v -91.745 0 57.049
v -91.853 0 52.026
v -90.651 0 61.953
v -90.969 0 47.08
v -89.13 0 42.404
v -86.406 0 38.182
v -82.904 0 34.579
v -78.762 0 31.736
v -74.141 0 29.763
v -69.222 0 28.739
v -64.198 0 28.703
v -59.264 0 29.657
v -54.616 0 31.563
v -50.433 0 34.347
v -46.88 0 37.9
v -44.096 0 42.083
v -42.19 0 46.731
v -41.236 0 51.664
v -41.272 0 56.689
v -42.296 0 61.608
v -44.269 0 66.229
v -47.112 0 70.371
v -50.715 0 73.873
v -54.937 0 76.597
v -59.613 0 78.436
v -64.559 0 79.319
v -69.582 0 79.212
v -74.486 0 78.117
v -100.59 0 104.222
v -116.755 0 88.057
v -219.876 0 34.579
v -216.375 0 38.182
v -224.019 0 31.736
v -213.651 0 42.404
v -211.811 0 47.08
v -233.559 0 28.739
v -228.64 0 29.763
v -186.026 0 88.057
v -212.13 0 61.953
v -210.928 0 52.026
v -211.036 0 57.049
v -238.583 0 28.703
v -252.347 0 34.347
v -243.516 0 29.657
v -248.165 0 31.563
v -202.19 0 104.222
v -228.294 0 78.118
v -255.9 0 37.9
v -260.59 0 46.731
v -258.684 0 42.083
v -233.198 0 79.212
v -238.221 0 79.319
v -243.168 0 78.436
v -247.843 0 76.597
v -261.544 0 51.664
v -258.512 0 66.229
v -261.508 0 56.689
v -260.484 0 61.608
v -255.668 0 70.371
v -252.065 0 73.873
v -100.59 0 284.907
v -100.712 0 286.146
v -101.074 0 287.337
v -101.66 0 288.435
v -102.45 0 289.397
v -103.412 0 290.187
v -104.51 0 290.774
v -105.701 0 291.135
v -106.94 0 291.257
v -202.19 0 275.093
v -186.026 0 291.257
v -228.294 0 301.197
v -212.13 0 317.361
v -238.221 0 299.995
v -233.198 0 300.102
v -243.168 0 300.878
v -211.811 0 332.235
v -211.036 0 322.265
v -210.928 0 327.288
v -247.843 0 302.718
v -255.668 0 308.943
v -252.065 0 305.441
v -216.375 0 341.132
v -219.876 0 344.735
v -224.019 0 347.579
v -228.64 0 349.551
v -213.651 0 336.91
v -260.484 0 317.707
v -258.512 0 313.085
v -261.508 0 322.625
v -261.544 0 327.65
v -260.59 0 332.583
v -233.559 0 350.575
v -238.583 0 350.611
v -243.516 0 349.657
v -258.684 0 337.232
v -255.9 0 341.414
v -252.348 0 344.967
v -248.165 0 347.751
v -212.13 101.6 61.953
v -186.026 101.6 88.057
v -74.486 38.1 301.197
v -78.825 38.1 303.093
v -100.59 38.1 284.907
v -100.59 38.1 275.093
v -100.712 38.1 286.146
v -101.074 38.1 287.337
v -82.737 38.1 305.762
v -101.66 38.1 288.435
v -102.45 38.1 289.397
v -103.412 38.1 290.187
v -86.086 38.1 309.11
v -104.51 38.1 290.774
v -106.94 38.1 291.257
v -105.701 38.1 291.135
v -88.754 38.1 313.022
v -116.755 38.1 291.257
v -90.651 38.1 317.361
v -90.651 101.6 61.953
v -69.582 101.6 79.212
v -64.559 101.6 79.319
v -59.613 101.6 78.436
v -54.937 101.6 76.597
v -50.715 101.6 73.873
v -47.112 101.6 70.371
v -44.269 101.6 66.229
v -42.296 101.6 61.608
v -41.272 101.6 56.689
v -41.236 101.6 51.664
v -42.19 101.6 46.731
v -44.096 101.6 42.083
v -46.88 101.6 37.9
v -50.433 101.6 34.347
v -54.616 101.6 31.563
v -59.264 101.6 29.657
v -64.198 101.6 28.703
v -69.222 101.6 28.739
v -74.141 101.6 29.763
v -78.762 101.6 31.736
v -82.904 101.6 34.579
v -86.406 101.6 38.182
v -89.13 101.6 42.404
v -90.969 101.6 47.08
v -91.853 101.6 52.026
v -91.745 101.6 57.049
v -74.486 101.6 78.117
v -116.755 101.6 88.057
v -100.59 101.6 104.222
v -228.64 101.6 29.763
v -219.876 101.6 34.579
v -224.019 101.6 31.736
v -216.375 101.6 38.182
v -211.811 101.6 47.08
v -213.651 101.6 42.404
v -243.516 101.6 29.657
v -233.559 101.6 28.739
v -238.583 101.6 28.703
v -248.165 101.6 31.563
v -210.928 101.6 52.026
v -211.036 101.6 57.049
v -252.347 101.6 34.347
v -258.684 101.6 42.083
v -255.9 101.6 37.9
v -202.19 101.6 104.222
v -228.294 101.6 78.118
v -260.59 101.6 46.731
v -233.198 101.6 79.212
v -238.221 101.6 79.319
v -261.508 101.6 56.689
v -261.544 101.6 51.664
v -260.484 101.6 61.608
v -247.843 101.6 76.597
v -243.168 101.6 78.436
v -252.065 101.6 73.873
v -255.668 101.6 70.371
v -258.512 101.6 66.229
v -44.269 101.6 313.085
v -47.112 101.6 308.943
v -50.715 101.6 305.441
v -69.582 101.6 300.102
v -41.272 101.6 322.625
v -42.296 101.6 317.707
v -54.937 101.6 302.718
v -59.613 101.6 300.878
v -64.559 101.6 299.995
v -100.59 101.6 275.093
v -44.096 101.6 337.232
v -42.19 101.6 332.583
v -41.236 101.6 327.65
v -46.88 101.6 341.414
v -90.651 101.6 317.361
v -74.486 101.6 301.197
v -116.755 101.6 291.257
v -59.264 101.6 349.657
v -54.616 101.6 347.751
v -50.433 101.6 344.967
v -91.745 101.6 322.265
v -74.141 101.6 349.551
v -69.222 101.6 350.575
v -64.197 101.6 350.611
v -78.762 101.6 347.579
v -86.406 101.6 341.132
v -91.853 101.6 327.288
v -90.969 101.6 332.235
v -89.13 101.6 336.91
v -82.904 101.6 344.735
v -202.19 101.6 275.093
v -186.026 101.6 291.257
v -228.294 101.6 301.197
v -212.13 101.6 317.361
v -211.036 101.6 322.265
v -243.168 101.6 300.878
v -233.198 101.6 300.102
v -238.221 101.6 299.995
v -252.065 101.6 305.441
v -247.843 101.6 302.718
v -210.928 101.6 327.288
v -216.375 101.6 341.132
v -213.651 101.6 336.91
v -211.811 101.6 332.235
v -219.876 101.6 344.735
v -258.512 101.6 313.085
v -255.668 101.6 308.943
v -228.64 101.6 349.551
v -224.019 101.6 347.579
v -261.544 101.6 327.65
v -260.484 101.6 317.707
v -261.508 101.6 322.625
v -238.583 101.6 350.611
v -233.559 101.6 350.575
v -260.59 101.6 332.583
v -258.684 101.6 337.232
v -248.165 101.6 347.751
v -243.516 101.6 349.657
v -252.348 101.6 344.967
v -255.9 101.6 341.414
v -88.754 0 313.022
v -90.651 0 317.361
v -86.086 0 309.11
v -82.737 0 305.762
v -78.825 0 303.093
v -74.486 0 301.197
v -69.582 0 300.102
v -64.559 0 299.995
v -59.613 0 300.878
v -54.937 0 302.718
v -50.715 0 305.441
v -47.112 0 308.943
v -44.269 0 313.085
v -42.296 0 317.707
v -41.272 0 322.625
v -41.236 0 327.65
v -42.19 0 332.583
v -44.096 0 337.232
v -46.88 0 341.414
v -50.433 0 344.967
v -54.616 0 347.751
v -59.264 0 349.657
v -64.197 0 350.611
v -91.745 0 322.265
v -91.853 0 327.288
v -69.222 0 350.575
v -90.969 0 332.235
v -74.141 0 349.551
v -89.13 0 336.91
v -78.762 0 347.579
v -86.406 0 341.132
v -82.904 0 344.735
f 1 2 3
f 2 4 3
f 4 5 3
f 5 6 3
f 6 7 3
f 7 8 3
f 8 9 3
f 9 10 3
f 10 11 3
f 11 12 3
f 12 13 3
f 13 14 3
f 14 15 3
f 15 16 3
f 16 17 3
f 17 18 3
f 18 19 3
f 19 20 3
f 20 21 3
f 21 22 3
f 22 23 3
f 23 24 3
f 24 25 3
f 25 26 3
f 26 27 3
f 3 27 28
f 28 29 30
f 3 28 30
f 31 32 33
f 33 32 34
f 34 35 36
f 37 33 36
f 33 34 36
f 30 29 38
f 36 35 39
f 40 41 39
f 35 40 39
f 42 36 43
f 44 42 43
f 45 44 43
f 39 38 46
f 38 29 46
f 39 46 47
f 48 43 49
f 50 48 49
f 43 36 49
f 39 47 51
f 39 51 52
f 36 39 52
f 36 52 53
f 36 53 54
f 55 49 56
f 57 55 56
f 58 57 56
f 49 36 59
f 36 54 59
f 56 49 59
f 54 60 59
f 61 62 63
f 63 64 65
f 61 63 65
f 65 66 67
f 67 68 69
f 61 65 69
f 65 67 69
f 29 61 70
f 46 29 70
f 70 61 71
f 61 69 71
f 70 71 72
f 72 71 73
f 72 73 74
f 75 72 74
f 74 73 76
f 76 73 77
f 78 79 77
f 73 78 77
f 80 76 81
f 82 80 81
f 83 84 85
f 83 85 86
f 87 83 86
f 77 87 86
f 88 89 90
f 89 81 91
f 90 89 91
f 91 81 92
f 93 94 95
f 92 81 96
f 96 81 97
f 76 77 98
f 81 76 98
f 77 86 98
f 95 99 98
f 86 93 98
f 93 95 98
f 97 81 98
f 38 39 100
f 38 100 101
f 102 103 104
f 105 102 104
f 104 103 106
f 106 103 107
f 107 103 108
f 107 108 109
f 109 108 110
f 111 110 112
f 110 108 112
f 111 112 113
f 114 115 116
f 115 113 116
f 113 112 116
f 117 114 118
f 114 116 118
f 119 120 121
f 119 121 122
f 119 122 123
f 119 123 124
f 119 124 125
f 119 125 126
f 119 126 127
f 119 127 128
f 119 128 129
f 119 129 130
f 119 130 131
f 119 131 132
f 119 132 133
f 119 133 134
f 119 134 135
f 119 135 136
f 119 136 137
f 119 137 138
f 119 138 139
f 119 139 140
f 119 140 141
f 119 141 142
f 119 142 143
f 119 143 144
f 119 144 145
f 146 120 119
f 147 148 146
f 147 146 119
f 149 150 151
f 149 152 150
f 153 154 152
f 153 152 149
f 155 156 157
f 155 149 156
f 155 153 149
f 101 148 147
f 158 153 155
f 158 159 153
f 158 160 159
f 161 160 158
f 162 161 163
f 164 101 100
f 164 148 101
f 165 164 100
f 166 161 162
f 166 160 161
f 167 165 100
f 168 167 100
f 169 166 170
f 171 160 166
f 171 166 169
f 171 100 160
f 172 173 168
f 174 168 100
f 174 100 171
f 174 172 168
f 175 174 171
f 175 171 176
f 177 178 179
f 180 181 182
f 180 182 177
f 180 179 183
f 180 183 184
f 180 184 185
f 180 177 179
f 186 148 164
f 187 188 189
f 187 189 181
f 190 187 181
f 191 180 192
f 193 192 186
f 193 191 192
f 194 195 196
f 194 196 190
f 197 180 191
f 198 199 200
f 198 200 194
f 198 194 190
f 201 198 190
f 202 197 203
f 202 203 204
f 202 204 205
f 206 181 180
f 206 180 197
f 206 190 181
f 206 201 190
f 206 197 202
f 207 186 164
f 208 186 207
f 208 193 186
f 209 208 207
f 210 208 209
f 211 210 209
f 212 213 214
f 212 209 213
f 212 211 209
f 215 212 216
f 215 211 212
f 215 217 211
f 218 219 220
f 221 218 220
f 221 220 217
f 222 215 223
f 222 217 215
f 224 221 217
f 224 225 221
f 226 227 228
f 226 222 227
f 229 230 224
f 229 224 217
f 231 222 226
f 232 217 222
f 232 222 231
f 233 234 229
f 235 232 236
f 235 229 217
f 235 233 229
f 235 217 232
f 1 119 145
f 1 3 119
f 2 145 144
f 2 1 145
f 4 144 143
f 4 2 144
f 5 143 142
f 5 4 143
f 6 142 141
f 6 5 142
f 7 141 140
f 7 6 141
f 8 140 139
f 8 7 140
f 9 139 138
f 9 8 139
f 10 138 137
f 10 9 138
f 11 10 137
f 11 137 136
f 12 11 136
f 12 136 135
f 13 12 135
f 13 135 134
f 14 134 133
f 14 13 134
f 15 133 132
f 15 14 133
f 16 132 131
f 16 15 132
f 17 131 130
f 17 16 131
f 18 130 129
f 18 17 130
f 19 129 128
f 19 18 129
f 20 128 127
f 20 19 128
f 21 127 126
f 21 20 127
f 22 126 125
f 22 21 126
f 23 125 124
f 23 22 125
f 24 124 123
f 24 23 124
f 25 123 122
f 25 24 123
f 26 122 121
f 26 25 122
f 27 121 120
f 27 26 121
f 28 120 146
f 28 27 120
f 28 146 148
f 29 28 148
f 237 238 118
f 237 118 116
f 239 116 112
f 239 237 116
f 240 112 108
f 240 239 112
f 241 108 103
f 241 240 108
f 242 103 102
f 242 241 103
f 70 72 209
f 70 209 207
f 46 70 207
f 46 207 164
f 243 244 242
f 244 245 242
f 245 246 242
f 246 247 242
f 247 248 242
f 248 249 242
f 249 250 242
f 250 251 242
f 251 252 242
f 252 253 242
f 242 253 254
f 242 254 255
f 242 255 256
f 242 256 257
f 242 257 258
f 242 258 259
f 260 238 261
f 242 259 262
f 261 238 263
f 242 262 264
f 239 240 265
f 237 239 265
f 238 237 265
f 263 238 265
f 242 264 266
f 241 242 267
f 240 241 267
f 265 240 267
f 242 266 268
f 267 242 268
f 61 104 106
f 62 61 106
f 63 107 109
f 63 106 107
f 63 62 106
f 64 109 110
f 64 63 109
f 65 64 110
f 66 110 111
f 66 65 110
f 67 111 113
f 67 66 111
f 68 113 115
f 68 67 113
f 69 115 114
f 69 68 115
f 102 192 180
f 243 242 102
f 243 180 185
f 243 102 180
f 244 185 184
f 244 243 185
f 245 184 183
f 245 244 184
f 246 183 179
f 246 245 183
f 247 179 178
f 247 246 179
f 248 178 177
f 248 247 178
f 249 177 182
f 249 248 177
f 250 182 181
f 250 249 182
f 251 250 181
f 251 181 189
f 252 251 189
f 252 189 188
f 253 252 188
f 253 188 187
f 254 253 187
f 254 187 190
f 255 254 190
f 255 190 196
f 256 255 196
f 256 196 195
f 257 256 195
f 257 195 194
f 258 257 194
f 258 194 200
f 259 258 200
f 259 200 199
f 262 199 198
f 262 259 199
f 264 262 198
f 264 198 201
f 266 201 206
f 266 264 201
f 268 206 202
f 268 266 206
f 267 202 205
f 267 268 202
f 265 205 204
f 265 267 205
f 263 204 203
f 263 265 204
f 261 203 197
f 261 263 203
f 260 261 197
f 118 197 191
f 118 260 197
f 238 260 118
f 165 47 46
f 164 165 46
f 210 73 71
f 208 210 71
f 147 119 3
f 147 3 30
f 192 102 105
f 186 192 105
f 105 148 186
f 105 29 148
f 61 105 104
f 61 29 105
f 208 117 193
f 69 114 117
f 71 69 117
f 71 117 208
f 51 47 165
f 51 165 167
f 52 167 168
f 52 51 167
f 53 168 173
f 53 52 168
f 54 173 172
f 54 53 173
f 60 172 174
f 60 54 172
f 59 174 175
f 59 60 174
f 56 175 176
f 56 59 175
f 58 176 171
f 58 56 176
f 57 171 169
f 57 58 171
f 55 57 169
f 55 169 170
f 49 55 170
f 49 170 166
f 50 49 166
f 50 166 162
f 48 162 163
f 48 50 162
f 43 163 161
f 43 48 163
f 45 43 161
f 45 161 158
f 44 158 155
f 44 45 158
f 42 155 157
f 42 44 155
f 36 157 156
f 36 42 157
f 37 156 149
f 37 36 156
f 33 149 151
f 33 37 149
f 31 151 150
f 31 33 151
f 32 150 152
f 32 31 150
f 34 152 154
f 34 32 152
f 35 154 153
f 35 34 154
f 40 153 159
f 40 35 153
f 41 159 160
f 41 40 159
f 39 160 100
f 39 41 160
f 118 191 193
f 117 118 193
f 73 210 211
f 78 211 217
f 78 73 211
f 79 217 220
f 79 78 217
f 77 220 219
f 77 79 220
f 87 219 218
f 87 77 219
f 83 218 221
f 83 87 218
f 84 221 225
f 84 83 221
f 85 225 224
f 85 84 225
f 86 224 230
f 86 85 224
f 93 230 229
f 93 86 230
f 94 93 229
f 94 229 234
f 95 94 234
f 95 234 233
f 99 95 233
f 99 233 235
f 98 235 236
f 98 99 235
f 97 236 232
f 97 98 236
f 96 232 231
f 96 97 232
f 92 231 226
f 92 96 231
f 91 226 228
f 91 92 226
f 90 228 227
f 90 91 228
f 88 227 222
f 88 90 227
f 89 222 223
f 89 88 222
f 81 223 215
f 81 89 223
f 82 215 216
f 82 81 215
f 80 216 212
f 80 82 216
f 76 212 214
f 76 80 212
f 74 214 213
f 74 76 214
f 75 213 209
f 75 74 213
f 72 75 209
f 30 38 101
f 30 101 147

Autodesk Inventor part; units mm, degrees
ref_plane "YZ Plane" through (0, 0, 0) normal (1, 0, 0) x (0, 1, 0)
ref_plane "XZ Plane" through (0, 0, 0) normal (0, 1, 0) x (-1, 0, 0)
ref_plane "XY Plane" through (0, 0, 0) normal (0, 0, 1) x (1, 0, 0)
sketch "Sketch1" plane through (0, 0, 0) normal (0, 1, 0) x (-1, 0, 0)
  line L0 (106.9403, 291.2572) -> (195.8403, 291.2572)
  line L1 (202.1903, 284.9072) -> (202.1903, 94.4072)
  line L2 (195.8403, 88.0572) -> (106.9403, 88.0572)
  line L3 (100.5903, 94.4072) -> (100.5903, 284.9072)
  arc A0 (202.1903, 284.9072) -> (195.8403, 291.2572) centre (195.8403, 284.9072) ccw
  arc A1 (195.8403, 88.0572) -> (202.1903, 94.4072) centre (195.8403, 94.4072) ccw
  arc A2 (106.9403, 291.2572) -> (100.5903, 284.9072) centre (106.9403, 284.9072) ccw
  arc A3 (100.5903, 94.4072) -> (106.9403, 88.0572) centre (106.9403, 94.4072) ccw
  line L4 (200.3304, 289.3973) -> (236.2514, 325.3183)
  line L5 (200.3304, 289.3973) -> (251.1304, 289.3973) construction
  line L6 (200.3304, 89.917) -> (236.2514, 53.996)
  line L7 (200.3304, 89.917) -> (251.1304, 89.917) construction
  line L8 (102.4502, 289.3973) -> (66.5291, 325.3183) construction
  line L9 (102.4502, 89.917) -> (66.5291, 53.996)
  line L10 (102.4502, 89.917) -> (153.2502, 89.917) construction
  arc A4 (228.2944, 301.1968) -> (212.13, 317.3613) centre (236.2514, 325.3183) ccw
  circle A5 centre (236.2514, 53.996) radius 25.4
  arc A6 (90.6506, 317.3613) -> (74.4862, 301.1968) centre (66.5291, 325.3183) ccw
  circle A7 centre (66.5291, 53.996) radius 25.4
  line L11 (66.5291, 325.3183) -> (58.4469, 317.2361)
  line L12 (58.4469, 317.2361) -> (100.5903, 275.0927)
  line L13 (66.5291, 325.3183) -> (74.6114, 333.4006)
  line L14 (74.6114, 333.4006) -> (116.7547, 291.2572)
  line L15 (236.2514, 325.3183) -> (228.1692, 333.4006)
  line L16 (228.1692, 333.4006) -> (236.2514, 325.3183)
  line L17 (236.2514, 325.3183) -> (244.3337, 317.2361)
  line L18 (228.1692, 333.4006) -> (186.0258, 291.2572)
  line L19 (244.3337, 317.2361) -> (202.1903, 275.0927)
  line L20 (293.8482, 183.4348) -> (-26.9886, 183.4348) construction
  line L21 (236.2514, 53.996) -> (228.1692, 45.9138)
  line L22 (236.2514, 53.996) -> (247.6814, 53.996) construction
  line L23 (236.2514, 53.996) -> (244.3337, 62.0783)
  line L24 (228.1692, 45.9138) -> (186.0258, 88.0572)
  line L25 (244.3337, 62.0783) -> (202.1903, 104.2216)
  line L26 (66.5291, 53.996) -> (74.6114, 45.9138)
  line L27 (66.5291, 53.996) -> (58.4469, 62.0783)
  line L28 (58.4469, 62.0783) -> (100.5903, 104.2216)
  line L29 (74.6114, 45.9138) -> (116.7547, 88.0572)
  circle A8 centre (66.5291, 325.3183) radius 25.4
  circle A9 centre (236.2514, 325.3183) radius 25.4
  line L30 (66.5291, 325.3183) -> (102.4502, 289.3973)
  point P0 (0, 0)
  point P1 (202.1903, 88.0572)
  point P2 (202.1903, 291.2572)
  point P3 (100.5903, 88.0572)
  point P4 (228.2944, 78.1175)
  point P5 (212.13, 61.953)
  point P6 (74.4862, 78.1175)
  point P7 (90.6506, 61.953)
  point P8 (74.4862, 301.1968)
  dimension "d0" = 101.6
  dimension "d1" = 203.2
  dimension "d2" = 6.35
  dimension "d3" = 50.8
  dimension "d4" = 45
  dimension "d5" = 50.8
  dimension "d6" = 45
  dimension "d7" = 50.8
  dimension "d8" = 50.8
  dimension "d9" = 135
  dimension "d10" = 50.8
  dimension "d11" = 50.8
  dimension "d12" = 50.8
  dimension "d13" = 50.8
  dimension "d14" = 11.43
  dimension "d15" = 11.43
  dimension "d16" = 11.43
  dimension "d17" = 135
  dimension "d18" = 11.43
  dimension "d19" = 11.43
  dimension "d20" = 11.43
extrude "Extrusion1" add sketch "Sketch1" along normal blind 101.6 contours L0 A0 L1 A1 L2 A3 L3 A2
extrude "Extrusion2" add sketch "Sketch1" along normal blind 101.6 contours A2 L30 A8 L14 L0 | A2 L3 L12 A8 L30 | L18 A9 L4 A0 L0 | L14 L13 L11 L12 A6 | A8 L30 L13 L14 | A8 L12 L11 L30 | A4 L19 L17 L15 L18 | L18 L15 L4 A9 | L4 A9 L19 L1 A0 | L4 L17 L19 A9 | L3 A3 L9 A7 L28 | L28 L27 L26 L29 A7 | A7 L9 L27 L28 | A3 L2 L29 A7 L9 | A7 L29 L26 L9 | L25 A5 L6 A1 L1 | L25 L23 L6 A5 | A5 L24 L21 L23 L25 | L6 A5 L24 L2 A1 | L6 L21 L24 A5
extrude "Extrusion3" cut sketch "Sketch1" along normal blind 38.1 contours A2 L30 A8 L14 L0 | A2 L3 L12 A8 L30
sketch "Sketch2" plane through (0, 101.6, 0) normal (0, 1, 0) x (1, 0, 0)
  line L0 (106.9403, 291.2572) -> (195.8403, 291.2572)
  line L1 (202.1903, 284.9072) -> (202.1903, 94.4072)
  line L2 (195.8403, 88.0572) -> (106.9403, 88.0572)
  line L3 (100.5903, 94.4072) -> (100.5903, 284.9072)
  arc A0 (202.1903, 284.9072) -> (195.8403, 291.2572) centre (195.8403, 284.9072) ccw
  arc A1 (195.8403, 88.0572) -> (202.1903, 94.4072) centre (195.8403, 94.4072) ccw
  arc A2 (106.9403, 291.2572) -> (100.5903, 284.9072) centre (106.9403, 284.9072) ccw
  arc A3 (100.5903, 94.4072) -> (106.9403, 88.0572) centre (106.9403, 94.4072) ccw
  line L4 (200.3304, 289.3973) -> (236.2514, 325.3183)
  line L5 (200.3304, 289.3973) -> (251.1304, 289.3973) construction
  line L6 (200.3304, 89.917) -> (236.2514, 53.996)
  line L7 (200.3304, 89.917) -> (251.1304, 89.917) construction
  line L8 (102.4502, 289.3973) -> (66.5291, 325.3183) construction
  line L9 (102.4502, 89.917) -> (66.5291, 53.996)
  line L10 (102.4502, 89.917) -> (153.2502, 89.917) construction
  arc A4 (228.2944, 301.1968) -> (212.13, 317.3613) centre (236.2514, 325.3183) ccw
  circle A5 centre (236.2514, 53.996) radius 25.4
  arc A6 (90.6506, 317.3613) -> (74.4862, 301.1968) centre (66.5291, 325.3183) ccw
  circle A7 centre (66.5291, 53.996) radius 25.4
  line L11 (66.5291, 325.3183) -> (58.4469, 317.2361)
  line L12 (58.4469, 317.2361) -> (100.5903, 275.0927)
  line L13 (66.5291, 325.3183) -> (74.6114, 333.4006)
  line L14 (74.6114, 333.4006) -> (116.7547, 291.2572)
  line L15 (236.2514, 325.3183) -> (228.1692, 333.4006)
  line L16 (228.1692, 333.4006) -> (236.2514, 325.3183)
  line L17 (236.2514, 325.3183) -> (244.3337, 317.2361)
  line L18 (228.1692, 333.4006) -> (186.0258, 291.2572)
  line L19 (244.3337, 317.2361) -> (202.1903, 275.0927)
  line L20 (293.8482, 183.4348) -> (-26.9886, 183.4348) construction
  line L21 (236.2514, 53.996) -> (228.1692, 45.9138)
  line L22 (236.2514, 53.996) -> (247.6814, 53.996) construction
  line L23 (236.2514, 53.996) -> (244.3337, 62.0783)
  line L24 (228.1692, 45.9138) -> (186.0258, 88.0572)
  line L25 (244.3337, 62.0783) -> (202.1903, 104.2216)
  line L26 (66.5291, 53.996) -> (74.6114, 45.9138)
  line L27 (66.5291, 53.996) -> (58.4469, 62.0783)
  line L28 (58.4469, 62.0783) -> (100.5903, 104.2216)
  line L29 (74.6114, 45.9138) -> (116.7547, 88.0572)
  circle A8 centre (66.5291, 325.3183) radius 25.4
  circle A9 centre (236.2514, 325.3183) radius 25.4
  line L30 (66.5291, 325.3183) -> (102.4502, 289.3973)
  line L31 (200.3304, 289.3973) -> (102.4502, 89.917)
  line L32 (200.3304, 89.917) -> (102.4502, 289.3973)
  point P0 (0, 0)
  point P1 (202.1903, 88.0572)
  point P2 (202.1903, 291.2572)
  point P3 (100.5903, 88.0572)
  point P4 (228.2944, 78.1175)
  point P5 (212.13, 61.953)
  point P6 (74.4862, 78.1175)
  point P7 (90.6506, 61.953)
  point P8 (74.4862, 301.1968)
  dimension "d27" = 101.6
  dimension "d28" = 203.2
  dimension "d29" = 6.35
  dimension "d30" = 50.8
  dimension "d31" = 45
  dimension "d32" = 50.8
  dimension "d33" = 45
  dimension "d34" = 50.8
  dimension "d35" = 50.8
  dimension "d36" = 135
  dimension "d37" = 50.8
  dimension "d38" = 50.8
  dimension "d39" = 50.8
  dimension "d40" = 50.8
  dimension "d41" = 11.43
  dimension "d42" = 11.43
  dimension "d43" = 11.43
  dimension "d44" = 135
  dimension "d45" = 11.43
  dimension "d46" = 11.43
  dimension "d47" = 11.43
